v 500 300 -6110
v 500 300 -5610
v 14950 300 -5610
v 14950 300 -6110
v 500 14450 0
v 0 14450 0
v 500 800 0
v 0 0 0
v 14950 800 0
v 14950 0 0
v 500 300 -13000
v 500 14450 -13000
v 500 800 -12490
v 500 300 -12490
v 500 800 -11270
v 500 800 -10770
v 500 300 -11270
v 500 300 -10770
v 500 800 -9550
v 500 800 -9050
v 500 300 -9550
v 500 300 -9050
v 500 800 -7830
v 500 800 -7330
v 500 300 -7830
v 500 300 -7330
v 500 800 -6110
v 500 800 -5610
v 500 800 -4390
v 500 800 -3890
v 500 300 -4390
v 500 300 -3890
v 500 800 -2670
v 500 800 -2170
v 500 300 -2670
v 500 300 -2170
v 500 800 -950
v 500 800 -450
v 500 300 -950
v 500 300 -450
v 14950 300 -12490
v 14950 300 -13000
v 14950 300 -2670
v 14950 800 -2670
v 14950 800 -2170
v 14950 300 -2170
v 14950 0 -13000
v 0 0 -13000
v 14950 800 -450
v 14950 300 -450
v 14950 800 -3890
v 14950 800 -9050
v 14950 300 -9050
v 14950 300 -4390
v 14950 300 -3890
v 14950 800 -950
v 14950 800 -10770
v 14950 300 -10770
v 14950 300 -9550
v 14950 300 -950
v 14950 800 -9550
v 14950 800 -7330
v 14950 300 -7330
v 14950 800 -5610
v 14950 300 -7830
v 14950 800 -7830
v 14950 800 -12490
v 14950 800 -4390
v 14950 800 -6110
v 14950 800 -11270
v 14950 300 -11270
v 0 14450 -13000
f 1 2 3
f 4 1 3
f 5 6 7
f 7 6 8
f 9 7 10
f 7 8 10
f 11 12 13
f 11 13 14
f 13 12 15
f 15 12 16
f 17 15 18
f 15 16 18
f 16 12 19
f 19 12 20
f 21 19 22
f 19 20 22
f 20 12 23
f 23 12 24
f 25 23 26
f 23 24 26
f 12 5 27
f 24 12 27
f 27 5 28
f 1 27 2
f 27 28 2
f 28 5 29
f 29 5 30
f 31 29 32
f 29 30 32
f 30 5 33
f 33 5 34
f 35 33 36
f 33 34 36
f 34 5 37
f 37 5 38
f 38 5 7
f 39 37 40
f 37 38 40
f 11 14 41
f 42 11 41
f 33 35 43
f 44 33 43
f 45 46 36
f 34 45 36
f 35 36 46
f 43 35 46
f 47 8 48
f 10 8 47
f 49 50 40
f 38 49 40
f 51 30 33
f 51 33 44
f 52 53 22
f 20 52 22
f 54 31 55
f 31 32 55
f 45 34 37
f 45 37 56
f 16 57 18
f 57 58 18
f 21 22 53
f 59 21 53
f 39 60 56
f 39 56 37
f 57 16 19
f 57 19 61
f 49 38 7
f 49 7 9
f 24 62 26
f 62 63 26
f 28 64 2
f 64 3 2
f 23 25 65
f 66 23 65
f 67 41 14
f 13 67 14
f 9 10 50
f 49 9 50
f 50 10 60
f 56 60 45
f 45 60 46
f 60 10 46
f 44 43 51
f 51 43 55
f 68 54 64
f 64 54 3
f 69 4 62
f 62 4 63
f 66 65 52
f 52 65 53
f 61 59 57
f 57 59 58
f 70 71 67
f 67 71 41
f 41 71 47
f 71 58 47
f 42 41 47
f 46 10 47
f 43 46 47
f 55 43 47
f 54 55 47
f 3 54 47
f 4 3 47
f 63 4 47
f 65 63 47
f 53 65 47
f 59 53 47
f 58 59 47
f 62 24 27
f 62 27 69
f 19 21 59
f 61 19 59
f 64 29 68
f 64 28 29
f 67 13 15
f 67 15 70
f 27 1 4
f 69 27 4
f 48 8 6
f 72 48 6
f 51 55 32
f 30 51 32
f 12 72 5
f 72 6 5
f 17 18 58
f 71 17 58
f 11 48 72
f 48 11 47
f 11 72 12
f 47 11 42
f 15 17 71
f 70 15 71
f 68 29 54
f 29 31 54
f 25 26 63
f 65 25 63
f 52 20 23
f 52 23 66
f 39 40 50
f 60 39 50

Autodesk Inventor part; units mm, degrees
ref_plane "YZ Plane" through (0, 0, 0) normal (1, 0, 0) x (0, 1, 0)
ref_plane "XZ Plane" through (0, 0, 0) normal (0, 1, 0) x (-1, 0, 0)
ref_plane "XY Plane" through (0, 0, 0) normal (0, 0, 1) x (1, 0, 0)
sketch "Sketch1" plane through (0, 0, 0) normal (0, 0, 1) x (1, 0, 0)
  line L0 (0, 0) -> (15000, 0)
  line L1 (0, 0) -> (0, 14450)
  line L2 (0, 14450) -> (500, 14450)
  line L3 (500, 14450) -> (500, 300)
  line L4 (500, 300) -> (14950, 300)
  line L5 (14950, 300) -> (14950, 0)
  dimension "d0" = 15000
  dimension "d1" = 14450
  dimension "d2" = 500
  dimension "d3" = 14150
  dimension "d4" = 14450
extrude "Extrusion1" add sketch "Sketch1" against normal blind 13000
sketch "Sketch2" plane through (500, 300, 0) normal (0, 1, 0) x (1, 0, 0)
  line L0 (14450, 0) -> (0, 0) projected
  line L1 (0, 0) -> (0, 13000) projected
  line L2 (-500, 0) -> (-500, 13000) projected
  dimension "d8" = 500
sketch "Sketch3" plane through (500, 300, 0) normal (0, 1, 0) x (1, 0, 0)
  line L0 (14450, 0) -> (14450, 13000) projected
  line L1 (14450, 0) -> (0, 0) projected
  line L2 (14450, 450) -> (0, 450)
  line L3 (14450, 950) -> (0, 950)
  line L4 (0, 0) -> (0, 13000) projected
  line L5 (0, 0) -> (0, 450)
  line L6 (14450, 0) -> (14450, 450)
  line L7 (0, 950) -> (14450, 950)
  line L8 (14450, 950) -> (14450, 2170)
  line L9 (14450, 2170) -> (0, 2170)
  line L10 (0, 2170) -> (0, 950)
  line L11 (0, 2670) -> (14450, 2670)
  line L12 (14450, 2670) -> (14450, 3890)
  line L13 (14450, 3890) -> (0, 3890)
  line L14 (0, 3890) -> (0, 2670)
  line L15 (0, 4390) -> (14450, 4390)
  line L16 (14450, 4390) -> (14450, 5610)
  line L17 (14450, 5610) -> (0, 5610)
  line L18 (0, 5610) -> (0, 4390)
  line L19 (0, 6110) -> (14450, 6110)
  line L20 (14450, 6110) -> (14450, 7330)
  line L21 (14450, 7330) -> (0, 7330)
  line L22 (0, 7330) -> (0, 6110)
  line L23 (0, 7830) -> (14450, 7830)
  line L24 (14450, 7830) -> (14450, 9050)
  line L25 (14450, 9050) -> (0, 9050)
  line L26 (0, 9050) -> (0, 7830)
  line L27 (0, 9550) -> (14450, 9550)
  line L28 (14450, 9550) -> (14450, 10770)
  line L29 (14450, 10770) -> (0, 10770)
  line L30 (0, 10770) -> (0, 9550)
  line L31 (0, 11270) -> (14450, 11270)
  line L32 (14450, 11270) -> (14450, 12490)
  line L33 (14450, 12490) -> (0, 12490)
  line L34 (0, 12490) -> (0, 11270)
  point P0 (-500, 0)
  point P1 (0, 5610)
  point P2 (0, 7330)
  point P3 (0, 10770)
  point P4 (0, 12490)
  dimension "d9" = 450
  dimension "d10" = 14450
  dimension "d11" = 14450
  dimension "d12" = 500
  dimension "d13" = 1220
  dimension "d14" = 500
  dimension "d15" = 1220
  dimension "d16" = 1220
  dimension "d17" = 500
  dimension "d18" = 1220
  dimension "d19" = 500
  dimension "d20" = 1220
  dimension "d21" = 500
  dimension "d22" = 1220
  dimension "d23" = 500
  dimension "d24" = 1220
  dimension "d25" = 500
extrude "Extrusion2" add sketch "Sketch3" along normal blind 500 contours L3 L4 L9 L0 | L11 L4 L13 L0 | L15 L4 L17 L0 | L19 L4 L21 L0 | L23 L4 L25 L0 | L27 L4 L29 L0 | L31 L4 L33 L0
sketch "Sketch4" plane through (500, 300, 0) normal (0, 1, 0) x (1, 0, 0)
  line L0 (0, 0) -> (0, 13000) projected
  line L1 (14450, 0) -> (14450, 13000) projected
  line L2 (0, 0) -> (14450, 0)
  line L3 (14450, 0) -> (14450, 450)
  line L4 (14450, 450) -> (0, 450)
  line L5 (0, 450) -> (0, 0)
  point P0 (-500, 0)
  dimension "d28" = 450
extrude "Extrusion3" add sketch "Sketch4" along normal blind 500
